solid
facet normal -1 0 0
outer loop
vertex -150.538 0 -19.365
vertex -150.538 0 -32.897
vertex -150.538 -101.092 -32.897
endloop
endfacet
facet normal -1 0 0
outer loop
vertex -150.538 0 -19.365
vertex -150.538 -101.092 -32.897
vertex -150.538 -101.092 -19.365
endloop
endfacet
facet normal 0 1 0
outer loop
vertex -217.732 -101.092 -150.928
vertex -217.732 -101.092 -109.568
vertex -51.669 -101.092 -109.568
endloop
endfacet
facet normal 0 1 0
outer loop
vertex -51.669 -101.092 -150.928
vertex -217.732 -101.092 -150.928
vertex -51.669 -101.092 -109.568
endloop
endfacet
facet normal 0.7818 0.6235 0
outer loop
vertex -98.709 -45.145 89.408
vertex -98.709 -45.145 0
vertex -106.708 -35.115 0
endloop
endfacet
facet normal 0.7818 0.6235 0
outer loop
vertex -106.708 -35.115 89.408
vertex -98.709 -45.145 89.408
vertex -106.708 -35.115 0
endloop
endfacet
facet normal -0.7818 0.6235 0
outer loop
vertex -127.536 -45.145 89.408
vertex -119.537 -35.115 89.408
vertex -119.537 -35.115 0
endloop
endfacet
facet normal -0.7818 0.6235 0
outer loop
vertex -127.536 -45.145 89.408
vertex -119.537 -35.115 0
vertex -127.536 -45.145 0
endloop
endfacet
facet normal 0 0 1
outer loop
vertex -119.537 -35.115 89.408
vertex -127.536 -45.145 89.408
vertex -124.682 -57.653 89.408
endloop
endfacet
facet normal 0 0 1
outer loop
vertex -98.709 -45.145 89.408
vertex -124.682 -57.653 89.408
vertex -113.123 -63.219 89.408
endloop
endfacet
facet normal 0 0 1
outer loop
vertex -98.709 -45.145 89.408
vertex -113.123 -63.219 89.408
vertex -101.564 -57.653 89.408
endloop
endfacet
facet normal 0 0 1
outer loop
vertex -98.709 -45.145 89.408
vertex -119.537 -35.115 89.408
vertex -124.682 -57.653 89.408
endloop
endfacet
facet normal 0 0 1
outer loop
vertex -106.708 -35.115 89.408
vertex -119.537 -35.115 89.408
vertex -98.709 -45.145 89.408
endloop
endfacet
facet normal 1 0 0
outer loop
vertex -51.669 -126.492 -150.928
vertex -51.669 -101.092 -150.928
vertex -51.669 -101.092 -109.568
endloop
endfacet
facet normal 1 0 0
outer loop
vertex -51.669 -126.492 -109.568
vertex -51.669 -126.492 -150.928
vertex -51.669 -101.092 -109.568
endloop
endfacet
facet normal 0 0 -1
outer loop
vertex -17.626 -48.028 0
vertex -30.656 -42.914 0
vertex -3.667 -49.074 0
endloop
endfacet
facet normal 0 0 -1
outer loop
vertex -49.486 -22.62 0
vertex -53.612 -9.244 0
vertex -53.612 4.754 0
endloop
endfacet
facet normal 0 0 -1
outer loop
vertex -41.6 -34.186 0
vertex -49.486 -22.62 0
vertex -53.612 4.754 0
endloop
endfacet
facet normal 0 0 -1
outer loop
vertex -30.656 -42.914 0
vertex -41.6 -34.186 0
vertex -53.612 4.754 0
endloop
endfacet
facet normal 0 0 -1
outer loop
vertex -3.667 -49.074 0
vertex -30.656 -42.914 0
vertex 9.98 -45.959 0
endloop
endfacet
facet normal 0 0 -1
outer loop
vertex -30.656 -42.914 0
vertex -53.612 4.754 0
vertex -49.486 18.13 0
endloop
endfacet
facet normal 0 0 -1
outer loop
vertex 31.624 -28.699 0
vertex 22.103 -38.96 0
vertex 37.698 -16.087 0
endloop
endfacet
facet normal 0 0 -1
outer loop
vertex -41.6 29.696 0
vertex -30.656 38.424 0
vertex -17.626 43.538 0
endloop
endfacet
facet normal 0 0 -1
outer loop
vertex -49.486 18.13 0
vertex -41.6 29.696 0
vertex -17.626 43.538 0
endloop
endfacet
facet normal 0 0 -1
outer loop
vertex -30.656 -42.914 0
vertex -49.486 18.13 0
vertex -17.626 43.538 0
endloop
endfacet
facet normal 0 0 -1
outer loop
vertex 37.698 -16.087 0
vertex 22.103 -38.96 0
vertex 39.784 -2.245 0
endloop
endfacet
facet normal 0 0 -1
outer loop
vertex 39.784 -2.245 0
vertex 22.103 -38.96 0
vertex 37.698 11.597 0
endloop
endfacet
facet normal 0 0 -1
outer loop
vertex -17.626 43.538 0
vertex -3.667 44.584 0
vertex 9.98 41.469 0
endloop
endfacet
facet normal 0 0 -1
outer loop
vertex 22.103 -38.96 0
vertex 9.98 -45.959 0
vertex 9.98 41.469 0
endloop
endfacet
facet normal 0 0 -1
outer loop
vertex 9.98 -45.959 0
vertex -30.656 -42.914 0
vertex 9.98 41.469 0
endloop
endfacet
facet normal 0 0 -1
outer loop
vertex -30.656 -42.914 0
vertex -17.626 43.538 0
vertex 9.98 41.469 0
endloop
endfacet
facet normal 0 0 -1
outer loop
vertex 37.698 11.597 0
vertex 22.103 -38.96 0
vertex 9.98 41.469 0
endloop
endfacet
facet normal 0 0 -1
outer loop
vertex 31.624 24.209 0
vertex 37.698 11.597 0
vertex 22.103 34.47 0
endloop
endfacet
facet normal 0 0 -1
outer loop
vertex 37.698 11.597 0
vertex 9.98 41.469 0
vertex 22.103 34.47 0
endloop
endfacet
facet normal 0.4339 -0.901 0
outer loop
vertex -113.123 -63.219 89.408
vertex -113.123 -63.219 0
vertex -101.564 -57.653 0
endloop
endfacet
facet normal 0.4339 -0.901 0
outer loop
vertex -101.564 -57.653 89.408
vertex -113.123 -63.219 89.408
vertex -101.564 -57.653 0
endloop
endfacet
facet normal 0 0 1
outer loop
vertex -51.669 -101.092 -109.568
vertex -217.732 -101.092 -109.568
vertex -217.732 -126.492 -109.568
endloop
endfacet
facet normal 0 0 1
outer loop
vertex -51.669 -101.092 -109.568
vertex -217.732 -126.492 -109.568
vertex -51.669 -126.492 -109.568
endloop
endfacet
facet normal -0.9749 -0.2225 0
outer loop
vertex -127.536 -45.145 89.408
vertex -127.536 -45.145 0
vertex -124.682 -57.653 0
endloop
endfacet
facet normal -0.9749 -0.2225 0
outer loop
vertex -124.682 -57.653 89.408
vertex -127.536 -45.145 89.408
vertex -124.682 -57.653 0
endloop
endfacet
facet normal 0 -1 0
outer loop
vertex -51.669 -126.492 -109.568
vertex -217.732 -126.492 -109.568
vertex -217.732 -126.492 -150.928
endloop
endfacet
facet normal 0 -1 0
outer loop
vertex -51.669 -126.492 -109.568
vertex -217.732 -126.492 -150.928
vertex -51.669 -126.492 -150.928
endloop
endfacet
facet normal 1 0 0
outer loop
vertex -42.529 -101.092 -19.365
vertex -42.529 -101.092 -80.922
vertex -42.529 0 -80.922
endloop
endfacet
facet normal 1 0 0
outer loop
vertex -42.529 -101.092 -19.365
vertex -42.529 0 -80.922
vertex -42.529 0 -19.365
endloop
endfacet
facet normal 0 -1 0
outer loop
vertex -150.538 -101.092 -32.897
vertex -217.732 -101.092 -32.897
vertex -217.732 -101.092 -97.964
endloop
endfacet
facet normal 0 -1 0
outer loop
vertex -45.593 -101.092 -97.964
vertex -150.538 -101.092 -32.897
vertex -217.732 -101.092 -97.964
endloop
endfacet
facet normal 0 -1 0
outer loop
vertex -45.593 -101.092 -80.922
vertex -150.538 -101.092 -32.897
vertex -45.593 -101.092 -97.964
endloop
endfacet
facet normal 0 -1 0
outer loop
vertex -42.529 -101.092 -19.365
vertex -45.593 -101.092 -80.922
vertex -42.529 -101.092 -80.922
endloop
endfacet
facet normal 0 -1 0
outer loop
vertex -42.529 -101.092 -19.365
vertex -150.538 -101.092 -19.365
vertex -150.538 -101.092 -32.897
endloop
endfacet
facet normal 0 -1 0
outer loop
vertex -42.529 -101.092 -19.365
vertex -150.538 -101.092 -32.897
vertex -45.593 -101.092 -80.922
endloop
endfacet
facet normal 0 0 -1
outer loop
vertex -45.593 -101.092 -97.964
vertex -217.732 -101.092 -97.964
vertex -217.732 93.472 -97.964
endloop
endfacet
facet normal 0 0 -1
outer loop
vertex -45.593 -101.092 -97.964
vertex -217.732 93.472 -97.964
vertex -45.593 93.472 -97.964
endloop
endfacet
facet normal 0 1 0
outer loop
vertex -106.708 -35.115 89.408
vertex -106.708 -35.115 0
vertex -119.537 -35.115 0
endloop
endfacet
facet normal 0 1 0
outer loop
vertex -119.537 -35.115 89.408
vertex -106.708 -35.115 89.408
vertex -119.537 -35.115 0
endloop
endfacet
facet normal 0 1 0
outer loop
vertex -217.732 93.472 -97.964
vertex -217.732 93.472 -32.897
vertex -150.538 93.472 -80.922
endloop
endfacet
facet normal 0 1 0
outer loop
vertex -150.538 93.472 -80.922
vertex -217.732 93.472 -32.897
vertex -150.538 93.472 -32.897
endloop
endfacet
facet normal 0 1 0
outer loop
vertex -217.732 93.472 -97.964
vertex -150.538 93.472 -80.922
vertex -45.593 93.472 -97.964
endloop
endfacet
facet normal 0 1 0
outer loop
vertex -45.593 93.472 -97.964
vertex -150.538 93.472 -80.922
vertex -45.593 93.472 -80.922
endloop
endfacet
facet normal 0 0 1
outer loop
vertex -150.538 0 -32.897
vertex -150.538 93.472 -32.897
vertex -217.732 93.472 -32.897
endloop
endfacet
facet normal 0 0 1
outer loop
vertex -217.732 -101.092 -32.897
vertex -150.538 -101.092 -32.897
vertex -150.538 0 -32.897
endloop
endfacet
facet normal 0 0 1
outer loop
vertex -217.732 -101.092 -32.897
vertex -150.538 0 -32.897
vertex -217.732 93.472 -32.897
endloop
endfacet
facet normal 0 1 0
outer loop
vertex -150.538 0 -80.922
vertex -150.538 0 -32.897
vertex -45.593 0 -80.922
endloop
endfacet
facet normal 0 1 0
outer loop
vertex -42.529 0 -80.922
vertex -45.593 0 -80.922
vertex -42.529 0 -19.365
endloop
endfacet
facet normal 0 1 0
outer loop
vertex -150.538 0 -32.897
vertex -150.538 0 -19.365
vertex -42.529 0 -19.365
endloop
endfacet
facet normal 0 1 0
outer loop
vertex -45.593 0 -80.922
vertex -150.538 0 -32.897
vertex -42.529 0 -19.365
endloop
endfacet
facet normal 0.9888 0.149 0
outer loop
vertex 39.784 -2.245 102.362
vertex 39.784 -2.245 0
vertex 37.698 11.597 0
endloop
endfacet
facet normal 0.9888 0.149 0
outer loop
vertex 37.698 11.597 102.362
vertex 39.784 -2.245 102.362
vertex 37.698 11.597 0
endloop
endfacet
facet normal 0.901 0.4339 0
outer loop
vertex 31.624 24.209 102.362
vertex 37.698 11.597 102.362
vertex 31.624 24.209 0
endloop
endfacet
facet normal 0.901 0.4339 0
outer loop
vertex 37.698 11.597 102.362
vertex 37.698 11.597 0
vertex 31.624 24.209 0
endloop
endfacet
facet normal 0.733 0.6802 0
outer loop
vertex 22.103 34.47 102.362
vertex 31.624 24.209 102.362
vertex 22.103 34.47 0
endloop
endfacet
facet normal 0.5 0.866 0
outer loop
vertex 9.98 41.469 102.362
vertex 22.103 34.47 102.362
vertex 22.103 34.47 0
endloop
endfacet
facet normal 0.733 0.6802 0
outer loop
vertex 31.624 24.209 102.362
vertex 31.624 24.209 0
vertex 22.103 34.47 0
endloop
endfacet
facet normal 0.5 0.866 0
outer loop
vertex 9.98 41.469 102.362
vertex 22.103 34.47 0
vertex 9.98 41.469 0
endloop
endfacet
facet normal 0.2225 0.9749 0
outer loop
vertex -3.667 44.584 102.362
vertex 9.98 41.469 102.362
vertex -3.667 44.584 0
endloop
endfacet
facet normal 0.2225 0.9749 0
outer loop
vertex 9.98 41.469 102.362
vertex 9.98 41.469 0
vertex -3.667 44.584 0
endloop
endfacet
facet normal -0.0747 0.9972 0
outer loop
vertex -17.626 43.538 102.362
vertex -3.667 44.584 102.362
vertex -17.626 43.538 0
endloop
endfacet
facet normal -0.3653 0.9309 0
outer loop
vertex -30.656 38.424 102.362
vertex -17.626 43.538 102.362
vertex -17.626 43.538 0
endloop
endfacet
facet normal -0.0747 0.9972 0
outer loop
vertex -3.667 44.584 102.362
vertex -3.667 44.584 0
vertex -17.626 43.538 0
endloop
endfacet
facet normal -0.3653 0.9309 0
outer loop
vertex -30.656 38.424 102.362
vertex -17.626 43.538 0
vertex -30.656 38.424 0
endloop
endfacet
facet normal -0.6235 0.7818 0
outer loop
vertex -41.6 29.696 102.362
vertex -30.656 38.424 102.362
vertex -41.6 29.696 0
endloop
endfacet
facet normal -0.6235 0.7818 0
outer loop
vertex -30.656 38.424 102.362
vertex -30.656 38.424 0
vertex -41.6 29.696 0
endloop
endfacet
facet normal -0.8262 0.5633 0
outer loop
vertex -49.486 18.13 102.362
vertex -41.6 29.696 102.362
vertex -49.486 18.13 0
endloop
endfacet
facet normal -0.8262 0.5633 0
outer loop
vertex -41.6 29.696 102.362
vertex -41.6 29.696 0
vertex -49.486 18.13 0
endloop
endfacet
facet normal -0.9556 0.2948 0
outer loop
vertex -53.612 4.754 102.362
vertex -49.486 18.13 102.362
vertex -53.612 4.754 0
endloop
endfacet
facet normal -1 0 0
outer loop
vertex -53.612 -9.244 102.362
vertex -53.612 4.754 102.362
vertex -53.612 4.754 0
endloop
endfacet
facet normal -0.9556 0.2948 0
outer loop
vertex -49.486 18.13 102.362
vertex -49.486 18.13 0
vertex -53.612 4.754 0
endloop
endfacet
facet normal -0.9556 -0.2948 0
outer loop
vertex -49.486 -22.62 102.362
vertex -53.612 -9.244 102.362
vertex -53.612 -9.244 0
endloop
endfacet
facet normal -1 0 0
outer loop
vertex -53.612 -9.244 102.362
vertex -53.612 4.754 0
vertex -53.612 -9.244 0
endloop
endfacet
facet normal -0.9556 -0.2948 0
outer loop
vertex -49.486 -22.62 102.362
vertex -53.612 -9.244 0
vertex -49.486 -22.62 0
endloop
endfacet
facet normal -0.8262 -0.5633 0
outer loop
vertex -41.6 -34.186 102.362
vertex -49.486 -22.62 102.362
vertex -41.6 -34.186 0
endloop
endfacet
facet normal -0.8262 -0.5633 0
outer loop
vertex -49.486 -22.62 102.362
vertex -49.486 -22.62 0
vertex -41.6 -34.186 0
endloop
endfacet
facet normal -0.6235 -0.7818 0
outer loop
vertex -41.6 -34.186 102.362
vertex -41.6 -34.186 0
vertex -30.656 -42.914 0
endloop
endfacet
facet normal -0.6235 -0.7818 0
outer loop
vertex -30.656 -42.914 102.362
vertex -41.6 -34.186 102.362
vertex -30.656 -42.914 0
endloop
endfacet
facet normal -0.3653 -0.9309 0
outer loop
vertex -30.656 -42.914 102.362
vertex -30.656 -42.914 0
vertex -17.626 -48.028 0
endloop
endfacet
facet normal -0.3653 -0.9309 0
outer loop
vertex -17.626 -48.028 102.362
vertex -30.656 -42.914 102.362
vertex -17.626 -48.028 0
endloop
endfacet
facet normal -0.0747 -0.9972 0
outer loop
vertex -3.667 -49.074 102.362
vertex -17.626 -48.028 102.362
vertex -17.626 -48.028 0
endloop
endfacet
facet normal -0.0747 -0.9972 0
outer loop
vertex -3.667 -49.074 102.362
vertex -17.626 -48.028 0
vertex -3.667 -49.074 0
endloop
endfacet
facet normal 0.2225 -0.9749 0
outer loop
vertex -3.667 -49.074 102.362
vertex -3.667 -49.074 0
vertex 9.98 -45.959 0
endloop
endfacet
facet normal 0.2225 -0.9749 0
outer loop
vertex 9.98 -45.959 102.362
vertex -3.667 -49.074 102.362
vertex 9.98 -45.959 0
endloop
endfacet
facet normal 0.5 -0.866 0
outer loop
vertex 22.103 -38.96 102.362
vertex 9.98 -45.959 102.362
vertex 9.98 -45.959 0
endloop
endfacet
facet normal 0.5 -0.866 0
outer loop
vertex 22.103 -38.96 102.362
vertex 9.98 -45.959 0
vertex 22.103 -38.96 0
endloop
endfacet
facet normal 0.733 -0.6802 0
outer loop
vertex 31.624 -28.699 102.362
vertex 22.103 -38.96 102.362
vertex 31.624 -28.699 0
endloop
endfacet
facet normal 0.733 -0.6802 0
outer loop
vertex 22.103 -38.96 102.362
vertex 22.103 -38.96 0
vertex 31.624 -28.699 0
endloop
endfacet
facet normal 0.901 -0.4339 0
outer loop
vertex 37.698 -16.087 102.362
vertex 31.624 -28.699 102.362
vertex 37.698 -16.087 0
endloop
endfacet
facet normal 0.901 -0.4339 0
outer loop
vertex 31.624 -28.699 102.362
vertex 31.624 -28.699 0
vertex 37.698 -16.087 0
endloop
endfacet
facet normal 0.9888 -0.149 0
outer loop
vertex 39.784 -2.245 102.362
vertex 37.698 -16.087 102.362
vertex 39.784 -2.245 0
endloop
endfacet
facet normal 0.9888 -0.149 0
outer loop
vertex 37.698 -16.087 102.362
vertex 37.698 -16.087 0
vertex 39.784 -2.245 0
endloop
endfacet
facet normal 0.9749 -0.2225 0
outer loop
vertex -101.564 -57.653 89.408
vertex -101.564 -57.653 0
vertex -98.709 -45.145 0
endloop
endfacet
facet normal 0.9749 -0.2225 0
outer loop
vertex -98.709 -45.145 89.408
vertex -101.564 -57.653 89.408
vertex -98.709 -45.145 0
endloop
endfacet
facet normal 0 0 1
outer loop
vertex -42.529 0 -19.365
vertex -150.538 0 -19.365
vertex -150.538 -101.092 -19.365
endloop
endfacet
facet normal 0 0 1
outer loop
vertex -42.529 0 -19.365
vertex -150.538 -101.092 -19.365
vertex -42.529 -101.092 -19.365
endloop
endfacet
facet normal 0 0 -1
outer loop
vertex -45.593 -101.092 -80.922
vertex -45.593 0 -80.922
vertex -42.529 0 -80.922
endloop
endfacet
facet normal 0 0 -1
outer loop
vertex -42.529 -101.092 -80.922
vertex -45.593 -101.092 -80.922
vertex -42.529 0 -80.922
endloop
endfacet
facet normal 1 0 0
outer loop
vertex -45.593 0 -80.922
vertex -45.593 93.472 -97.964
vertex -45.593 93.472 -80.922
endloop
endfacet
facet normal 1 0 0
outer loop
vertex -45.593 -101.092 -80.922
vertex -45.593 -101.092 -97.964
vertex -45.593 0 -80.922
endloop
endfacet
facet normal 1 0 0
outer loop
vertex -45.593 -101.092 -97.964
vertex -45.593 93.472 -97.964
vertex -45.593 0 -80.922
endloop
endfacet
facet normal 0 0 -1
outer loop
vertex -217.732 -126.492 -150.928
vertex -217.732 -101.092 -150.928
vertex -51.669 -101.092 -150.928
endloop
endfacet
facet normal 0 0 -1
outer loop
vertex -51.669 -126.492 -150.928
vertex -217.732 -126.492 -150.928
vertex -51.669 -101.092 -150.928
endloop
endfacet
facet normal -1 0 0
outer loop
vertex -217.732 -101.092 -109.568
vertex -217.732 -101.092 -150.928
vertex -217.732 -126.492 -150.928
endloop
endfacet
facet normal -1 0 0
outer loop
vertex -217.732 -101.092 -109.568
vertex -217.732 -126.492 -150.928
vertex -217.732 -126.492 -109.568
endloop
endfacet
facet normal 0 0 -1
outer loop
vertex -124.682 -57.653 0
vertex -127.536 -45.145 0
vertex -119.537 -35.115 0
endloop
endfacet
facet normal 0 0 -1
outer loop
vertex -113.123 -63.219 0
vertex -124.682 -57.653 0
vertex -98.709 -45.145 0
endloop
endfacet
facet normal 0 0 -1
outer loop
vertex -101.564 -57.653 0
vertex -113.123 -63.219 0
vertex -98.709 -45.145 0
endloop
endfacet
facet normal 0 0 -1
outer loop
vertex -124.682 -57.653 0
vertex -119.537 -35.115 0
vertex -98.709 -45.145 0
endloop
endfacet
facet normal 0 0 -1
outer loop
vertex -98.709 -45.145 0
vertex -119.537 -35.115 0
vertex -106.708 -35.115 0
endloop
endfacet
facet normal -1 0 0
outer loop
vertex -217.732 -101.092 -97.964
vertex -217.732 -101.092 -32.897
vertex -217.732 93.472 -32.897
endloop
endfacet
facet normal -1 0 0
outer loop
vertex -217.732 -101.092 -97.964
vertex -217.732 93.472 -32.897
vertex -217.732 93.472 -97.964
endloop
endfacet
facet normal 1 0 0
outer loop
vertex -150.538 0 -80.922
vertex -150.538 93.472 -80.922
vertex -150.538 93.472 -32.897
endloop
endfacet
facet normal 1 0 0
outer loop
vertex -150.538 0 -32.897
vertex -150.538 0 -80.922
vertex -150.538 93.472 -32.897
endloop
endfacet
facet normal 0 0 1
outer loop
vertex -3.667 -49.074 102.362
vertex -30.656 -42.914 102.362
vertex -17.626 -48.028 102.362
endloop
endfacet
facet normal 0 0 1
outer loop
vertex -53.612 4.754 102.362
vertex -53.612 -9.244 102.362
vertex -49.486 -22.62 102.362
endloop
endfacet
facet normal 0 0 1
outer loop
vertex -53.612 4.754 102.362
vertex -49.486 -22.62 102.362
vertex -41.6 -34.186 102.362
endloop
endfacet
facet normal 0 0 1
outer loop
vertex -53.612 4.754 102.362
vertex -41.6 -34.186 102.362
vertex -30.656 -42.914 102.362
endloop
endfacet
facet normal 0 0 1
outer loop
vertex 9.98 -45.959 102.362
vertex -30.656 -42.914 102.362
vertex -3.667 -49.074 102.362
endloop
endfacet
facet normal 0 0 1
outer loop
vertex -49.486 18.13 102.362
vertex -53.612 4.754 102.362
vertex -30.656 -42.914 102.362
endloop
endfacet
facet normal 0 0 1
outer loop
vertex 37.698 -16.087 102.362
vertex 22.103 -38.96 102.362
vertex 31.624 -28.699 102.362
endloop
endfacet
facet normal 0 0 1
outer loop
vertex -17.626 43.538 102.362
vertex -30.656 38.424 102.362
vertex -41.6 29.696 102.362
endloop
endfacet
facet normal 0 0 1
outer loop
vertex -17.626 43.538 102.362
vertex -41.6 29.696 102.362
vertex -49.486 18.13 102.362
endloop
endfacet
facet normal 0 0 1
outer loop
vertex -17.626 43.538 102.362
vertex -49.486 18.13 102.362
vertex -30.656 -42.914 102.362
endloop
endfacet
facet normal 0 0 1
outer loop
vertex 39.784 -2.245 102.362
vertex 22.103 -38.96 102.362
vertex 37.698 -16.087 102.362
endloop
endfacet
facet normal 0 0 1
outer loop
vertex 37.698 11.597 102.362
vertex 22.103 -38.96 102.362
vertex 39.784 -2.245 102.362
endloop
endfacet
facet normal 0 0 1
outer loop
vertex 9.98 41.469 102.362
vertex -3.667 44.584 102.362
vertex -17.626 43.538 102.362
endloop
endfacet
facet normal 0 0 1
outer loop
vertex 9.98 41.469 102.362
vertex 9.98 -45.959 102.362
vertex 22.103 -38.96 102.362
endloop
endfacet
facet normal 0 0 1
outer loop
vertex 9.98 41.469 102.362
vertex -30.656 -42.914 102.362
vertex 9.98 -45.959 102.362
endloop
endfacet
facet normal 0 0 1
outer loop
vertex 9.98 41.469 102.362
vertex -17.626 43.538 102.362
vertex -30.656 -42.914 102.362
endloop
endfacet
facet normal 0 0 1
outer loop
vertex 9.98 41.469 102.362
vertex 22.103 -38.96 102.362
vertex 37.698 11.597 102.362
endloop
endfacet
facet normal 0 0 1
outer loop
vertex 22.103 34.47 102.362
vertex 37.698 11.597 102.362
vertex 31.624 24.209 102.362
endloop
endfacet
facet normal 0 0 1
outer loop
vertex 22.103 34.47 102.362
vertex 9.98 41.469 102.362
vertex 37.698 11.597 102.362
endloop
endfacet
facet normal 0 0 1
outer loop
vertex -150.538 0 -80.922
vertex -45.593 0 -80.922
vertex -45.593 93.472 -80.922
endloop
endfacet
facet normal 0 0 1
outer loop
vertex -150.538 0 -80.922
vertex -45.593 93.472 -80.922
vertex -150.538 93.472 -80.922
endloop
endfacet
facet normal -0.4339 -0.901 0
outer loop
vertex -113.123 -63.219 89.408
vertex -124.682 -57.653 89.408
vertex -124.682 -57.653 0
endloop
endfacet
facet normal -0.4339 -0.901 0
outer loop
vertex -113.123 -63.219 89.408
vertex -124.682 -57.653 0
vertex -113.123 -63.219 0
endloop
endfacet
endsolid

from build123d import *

# Parameters (mm, degrees)
F0_R      = 46.9601079777
F1_DEPTH  = 102.362
F2_W      = 108.0089695752
F2_H      = 61.5570303053
F3_DEPTH  = 101.092
F5_DEPTH  = 89.408
F10_DEPTH = 194.564
F11_W     = 166.0638004541
F11_H     = 41.3593128324
F12_DEPTH = 25.4


# Not quite as in the source:
# - the program builds the solid bodies; features that only make, move or delete a surface that nothing else refers to are left out


with BuildPart() as f1:
    # F0 (on Top) → F1 (new body)
    with BuildSketch(Plane.XY):
        with Locations((-7.1760101607, -2.244985865)):
            Circle(F0_R)
    extrude(amount=F1_DEPTH)


with BuildPart() as f3:
    # F2 (on Front) → F3 (new body)
    with BuildSketch(Plane.XZ):
        with Locations((-96.5330209583, -50.1435371116)):
            Rectangle(F2_W, F2_H)
    extrude(amount=F3_DEPTH)

    # F9 (on face) → F10 (join)
    with BuildSketch(Plane.XZ.offset(101.092)):
        Polygon((-150.5375057459, -32.8971557319), (-217.7324593067, -32.8971557319), (-217.7324593067, -97.96436131), (-45.5931425095, -97.96436131), (-45.5931425095, -80.9220522642), (-150.5375057459, -80.9220522642), align=None)
    extrude(amount=-F10_DEPTH)


with BuildPart() as f5:
    # F4 (on Top) → F5 (new body)
    with BuildSketch(Plane.XY):
        Polygon((-106.7080545129, -35.1148024201), (-119.5374381838, -35.1148024201), (-127.5364280668, -45.1452184747), (-124.6816216302, -57.6529427116), (-113.1227463484, -63.2194036693), (-101.5638710665, -57.6529427116), (-98.70906463, -45.1452184747), align=None)
    extrude(amount=F5_DEPTH)


with BuildPart() as f12:
    # F11 (on face) → F12 (new body)
    with BuildSketch(Plane.XZ.offset(101.092)):
        with Locations((-134.7005590796, -130.2479021251)):
            Rectangle(F11_W, F11_H)
    extrude(amount=F12_DEPTH)


solid = Compound([f1.part, f3.part, f5.part, f12.part])
